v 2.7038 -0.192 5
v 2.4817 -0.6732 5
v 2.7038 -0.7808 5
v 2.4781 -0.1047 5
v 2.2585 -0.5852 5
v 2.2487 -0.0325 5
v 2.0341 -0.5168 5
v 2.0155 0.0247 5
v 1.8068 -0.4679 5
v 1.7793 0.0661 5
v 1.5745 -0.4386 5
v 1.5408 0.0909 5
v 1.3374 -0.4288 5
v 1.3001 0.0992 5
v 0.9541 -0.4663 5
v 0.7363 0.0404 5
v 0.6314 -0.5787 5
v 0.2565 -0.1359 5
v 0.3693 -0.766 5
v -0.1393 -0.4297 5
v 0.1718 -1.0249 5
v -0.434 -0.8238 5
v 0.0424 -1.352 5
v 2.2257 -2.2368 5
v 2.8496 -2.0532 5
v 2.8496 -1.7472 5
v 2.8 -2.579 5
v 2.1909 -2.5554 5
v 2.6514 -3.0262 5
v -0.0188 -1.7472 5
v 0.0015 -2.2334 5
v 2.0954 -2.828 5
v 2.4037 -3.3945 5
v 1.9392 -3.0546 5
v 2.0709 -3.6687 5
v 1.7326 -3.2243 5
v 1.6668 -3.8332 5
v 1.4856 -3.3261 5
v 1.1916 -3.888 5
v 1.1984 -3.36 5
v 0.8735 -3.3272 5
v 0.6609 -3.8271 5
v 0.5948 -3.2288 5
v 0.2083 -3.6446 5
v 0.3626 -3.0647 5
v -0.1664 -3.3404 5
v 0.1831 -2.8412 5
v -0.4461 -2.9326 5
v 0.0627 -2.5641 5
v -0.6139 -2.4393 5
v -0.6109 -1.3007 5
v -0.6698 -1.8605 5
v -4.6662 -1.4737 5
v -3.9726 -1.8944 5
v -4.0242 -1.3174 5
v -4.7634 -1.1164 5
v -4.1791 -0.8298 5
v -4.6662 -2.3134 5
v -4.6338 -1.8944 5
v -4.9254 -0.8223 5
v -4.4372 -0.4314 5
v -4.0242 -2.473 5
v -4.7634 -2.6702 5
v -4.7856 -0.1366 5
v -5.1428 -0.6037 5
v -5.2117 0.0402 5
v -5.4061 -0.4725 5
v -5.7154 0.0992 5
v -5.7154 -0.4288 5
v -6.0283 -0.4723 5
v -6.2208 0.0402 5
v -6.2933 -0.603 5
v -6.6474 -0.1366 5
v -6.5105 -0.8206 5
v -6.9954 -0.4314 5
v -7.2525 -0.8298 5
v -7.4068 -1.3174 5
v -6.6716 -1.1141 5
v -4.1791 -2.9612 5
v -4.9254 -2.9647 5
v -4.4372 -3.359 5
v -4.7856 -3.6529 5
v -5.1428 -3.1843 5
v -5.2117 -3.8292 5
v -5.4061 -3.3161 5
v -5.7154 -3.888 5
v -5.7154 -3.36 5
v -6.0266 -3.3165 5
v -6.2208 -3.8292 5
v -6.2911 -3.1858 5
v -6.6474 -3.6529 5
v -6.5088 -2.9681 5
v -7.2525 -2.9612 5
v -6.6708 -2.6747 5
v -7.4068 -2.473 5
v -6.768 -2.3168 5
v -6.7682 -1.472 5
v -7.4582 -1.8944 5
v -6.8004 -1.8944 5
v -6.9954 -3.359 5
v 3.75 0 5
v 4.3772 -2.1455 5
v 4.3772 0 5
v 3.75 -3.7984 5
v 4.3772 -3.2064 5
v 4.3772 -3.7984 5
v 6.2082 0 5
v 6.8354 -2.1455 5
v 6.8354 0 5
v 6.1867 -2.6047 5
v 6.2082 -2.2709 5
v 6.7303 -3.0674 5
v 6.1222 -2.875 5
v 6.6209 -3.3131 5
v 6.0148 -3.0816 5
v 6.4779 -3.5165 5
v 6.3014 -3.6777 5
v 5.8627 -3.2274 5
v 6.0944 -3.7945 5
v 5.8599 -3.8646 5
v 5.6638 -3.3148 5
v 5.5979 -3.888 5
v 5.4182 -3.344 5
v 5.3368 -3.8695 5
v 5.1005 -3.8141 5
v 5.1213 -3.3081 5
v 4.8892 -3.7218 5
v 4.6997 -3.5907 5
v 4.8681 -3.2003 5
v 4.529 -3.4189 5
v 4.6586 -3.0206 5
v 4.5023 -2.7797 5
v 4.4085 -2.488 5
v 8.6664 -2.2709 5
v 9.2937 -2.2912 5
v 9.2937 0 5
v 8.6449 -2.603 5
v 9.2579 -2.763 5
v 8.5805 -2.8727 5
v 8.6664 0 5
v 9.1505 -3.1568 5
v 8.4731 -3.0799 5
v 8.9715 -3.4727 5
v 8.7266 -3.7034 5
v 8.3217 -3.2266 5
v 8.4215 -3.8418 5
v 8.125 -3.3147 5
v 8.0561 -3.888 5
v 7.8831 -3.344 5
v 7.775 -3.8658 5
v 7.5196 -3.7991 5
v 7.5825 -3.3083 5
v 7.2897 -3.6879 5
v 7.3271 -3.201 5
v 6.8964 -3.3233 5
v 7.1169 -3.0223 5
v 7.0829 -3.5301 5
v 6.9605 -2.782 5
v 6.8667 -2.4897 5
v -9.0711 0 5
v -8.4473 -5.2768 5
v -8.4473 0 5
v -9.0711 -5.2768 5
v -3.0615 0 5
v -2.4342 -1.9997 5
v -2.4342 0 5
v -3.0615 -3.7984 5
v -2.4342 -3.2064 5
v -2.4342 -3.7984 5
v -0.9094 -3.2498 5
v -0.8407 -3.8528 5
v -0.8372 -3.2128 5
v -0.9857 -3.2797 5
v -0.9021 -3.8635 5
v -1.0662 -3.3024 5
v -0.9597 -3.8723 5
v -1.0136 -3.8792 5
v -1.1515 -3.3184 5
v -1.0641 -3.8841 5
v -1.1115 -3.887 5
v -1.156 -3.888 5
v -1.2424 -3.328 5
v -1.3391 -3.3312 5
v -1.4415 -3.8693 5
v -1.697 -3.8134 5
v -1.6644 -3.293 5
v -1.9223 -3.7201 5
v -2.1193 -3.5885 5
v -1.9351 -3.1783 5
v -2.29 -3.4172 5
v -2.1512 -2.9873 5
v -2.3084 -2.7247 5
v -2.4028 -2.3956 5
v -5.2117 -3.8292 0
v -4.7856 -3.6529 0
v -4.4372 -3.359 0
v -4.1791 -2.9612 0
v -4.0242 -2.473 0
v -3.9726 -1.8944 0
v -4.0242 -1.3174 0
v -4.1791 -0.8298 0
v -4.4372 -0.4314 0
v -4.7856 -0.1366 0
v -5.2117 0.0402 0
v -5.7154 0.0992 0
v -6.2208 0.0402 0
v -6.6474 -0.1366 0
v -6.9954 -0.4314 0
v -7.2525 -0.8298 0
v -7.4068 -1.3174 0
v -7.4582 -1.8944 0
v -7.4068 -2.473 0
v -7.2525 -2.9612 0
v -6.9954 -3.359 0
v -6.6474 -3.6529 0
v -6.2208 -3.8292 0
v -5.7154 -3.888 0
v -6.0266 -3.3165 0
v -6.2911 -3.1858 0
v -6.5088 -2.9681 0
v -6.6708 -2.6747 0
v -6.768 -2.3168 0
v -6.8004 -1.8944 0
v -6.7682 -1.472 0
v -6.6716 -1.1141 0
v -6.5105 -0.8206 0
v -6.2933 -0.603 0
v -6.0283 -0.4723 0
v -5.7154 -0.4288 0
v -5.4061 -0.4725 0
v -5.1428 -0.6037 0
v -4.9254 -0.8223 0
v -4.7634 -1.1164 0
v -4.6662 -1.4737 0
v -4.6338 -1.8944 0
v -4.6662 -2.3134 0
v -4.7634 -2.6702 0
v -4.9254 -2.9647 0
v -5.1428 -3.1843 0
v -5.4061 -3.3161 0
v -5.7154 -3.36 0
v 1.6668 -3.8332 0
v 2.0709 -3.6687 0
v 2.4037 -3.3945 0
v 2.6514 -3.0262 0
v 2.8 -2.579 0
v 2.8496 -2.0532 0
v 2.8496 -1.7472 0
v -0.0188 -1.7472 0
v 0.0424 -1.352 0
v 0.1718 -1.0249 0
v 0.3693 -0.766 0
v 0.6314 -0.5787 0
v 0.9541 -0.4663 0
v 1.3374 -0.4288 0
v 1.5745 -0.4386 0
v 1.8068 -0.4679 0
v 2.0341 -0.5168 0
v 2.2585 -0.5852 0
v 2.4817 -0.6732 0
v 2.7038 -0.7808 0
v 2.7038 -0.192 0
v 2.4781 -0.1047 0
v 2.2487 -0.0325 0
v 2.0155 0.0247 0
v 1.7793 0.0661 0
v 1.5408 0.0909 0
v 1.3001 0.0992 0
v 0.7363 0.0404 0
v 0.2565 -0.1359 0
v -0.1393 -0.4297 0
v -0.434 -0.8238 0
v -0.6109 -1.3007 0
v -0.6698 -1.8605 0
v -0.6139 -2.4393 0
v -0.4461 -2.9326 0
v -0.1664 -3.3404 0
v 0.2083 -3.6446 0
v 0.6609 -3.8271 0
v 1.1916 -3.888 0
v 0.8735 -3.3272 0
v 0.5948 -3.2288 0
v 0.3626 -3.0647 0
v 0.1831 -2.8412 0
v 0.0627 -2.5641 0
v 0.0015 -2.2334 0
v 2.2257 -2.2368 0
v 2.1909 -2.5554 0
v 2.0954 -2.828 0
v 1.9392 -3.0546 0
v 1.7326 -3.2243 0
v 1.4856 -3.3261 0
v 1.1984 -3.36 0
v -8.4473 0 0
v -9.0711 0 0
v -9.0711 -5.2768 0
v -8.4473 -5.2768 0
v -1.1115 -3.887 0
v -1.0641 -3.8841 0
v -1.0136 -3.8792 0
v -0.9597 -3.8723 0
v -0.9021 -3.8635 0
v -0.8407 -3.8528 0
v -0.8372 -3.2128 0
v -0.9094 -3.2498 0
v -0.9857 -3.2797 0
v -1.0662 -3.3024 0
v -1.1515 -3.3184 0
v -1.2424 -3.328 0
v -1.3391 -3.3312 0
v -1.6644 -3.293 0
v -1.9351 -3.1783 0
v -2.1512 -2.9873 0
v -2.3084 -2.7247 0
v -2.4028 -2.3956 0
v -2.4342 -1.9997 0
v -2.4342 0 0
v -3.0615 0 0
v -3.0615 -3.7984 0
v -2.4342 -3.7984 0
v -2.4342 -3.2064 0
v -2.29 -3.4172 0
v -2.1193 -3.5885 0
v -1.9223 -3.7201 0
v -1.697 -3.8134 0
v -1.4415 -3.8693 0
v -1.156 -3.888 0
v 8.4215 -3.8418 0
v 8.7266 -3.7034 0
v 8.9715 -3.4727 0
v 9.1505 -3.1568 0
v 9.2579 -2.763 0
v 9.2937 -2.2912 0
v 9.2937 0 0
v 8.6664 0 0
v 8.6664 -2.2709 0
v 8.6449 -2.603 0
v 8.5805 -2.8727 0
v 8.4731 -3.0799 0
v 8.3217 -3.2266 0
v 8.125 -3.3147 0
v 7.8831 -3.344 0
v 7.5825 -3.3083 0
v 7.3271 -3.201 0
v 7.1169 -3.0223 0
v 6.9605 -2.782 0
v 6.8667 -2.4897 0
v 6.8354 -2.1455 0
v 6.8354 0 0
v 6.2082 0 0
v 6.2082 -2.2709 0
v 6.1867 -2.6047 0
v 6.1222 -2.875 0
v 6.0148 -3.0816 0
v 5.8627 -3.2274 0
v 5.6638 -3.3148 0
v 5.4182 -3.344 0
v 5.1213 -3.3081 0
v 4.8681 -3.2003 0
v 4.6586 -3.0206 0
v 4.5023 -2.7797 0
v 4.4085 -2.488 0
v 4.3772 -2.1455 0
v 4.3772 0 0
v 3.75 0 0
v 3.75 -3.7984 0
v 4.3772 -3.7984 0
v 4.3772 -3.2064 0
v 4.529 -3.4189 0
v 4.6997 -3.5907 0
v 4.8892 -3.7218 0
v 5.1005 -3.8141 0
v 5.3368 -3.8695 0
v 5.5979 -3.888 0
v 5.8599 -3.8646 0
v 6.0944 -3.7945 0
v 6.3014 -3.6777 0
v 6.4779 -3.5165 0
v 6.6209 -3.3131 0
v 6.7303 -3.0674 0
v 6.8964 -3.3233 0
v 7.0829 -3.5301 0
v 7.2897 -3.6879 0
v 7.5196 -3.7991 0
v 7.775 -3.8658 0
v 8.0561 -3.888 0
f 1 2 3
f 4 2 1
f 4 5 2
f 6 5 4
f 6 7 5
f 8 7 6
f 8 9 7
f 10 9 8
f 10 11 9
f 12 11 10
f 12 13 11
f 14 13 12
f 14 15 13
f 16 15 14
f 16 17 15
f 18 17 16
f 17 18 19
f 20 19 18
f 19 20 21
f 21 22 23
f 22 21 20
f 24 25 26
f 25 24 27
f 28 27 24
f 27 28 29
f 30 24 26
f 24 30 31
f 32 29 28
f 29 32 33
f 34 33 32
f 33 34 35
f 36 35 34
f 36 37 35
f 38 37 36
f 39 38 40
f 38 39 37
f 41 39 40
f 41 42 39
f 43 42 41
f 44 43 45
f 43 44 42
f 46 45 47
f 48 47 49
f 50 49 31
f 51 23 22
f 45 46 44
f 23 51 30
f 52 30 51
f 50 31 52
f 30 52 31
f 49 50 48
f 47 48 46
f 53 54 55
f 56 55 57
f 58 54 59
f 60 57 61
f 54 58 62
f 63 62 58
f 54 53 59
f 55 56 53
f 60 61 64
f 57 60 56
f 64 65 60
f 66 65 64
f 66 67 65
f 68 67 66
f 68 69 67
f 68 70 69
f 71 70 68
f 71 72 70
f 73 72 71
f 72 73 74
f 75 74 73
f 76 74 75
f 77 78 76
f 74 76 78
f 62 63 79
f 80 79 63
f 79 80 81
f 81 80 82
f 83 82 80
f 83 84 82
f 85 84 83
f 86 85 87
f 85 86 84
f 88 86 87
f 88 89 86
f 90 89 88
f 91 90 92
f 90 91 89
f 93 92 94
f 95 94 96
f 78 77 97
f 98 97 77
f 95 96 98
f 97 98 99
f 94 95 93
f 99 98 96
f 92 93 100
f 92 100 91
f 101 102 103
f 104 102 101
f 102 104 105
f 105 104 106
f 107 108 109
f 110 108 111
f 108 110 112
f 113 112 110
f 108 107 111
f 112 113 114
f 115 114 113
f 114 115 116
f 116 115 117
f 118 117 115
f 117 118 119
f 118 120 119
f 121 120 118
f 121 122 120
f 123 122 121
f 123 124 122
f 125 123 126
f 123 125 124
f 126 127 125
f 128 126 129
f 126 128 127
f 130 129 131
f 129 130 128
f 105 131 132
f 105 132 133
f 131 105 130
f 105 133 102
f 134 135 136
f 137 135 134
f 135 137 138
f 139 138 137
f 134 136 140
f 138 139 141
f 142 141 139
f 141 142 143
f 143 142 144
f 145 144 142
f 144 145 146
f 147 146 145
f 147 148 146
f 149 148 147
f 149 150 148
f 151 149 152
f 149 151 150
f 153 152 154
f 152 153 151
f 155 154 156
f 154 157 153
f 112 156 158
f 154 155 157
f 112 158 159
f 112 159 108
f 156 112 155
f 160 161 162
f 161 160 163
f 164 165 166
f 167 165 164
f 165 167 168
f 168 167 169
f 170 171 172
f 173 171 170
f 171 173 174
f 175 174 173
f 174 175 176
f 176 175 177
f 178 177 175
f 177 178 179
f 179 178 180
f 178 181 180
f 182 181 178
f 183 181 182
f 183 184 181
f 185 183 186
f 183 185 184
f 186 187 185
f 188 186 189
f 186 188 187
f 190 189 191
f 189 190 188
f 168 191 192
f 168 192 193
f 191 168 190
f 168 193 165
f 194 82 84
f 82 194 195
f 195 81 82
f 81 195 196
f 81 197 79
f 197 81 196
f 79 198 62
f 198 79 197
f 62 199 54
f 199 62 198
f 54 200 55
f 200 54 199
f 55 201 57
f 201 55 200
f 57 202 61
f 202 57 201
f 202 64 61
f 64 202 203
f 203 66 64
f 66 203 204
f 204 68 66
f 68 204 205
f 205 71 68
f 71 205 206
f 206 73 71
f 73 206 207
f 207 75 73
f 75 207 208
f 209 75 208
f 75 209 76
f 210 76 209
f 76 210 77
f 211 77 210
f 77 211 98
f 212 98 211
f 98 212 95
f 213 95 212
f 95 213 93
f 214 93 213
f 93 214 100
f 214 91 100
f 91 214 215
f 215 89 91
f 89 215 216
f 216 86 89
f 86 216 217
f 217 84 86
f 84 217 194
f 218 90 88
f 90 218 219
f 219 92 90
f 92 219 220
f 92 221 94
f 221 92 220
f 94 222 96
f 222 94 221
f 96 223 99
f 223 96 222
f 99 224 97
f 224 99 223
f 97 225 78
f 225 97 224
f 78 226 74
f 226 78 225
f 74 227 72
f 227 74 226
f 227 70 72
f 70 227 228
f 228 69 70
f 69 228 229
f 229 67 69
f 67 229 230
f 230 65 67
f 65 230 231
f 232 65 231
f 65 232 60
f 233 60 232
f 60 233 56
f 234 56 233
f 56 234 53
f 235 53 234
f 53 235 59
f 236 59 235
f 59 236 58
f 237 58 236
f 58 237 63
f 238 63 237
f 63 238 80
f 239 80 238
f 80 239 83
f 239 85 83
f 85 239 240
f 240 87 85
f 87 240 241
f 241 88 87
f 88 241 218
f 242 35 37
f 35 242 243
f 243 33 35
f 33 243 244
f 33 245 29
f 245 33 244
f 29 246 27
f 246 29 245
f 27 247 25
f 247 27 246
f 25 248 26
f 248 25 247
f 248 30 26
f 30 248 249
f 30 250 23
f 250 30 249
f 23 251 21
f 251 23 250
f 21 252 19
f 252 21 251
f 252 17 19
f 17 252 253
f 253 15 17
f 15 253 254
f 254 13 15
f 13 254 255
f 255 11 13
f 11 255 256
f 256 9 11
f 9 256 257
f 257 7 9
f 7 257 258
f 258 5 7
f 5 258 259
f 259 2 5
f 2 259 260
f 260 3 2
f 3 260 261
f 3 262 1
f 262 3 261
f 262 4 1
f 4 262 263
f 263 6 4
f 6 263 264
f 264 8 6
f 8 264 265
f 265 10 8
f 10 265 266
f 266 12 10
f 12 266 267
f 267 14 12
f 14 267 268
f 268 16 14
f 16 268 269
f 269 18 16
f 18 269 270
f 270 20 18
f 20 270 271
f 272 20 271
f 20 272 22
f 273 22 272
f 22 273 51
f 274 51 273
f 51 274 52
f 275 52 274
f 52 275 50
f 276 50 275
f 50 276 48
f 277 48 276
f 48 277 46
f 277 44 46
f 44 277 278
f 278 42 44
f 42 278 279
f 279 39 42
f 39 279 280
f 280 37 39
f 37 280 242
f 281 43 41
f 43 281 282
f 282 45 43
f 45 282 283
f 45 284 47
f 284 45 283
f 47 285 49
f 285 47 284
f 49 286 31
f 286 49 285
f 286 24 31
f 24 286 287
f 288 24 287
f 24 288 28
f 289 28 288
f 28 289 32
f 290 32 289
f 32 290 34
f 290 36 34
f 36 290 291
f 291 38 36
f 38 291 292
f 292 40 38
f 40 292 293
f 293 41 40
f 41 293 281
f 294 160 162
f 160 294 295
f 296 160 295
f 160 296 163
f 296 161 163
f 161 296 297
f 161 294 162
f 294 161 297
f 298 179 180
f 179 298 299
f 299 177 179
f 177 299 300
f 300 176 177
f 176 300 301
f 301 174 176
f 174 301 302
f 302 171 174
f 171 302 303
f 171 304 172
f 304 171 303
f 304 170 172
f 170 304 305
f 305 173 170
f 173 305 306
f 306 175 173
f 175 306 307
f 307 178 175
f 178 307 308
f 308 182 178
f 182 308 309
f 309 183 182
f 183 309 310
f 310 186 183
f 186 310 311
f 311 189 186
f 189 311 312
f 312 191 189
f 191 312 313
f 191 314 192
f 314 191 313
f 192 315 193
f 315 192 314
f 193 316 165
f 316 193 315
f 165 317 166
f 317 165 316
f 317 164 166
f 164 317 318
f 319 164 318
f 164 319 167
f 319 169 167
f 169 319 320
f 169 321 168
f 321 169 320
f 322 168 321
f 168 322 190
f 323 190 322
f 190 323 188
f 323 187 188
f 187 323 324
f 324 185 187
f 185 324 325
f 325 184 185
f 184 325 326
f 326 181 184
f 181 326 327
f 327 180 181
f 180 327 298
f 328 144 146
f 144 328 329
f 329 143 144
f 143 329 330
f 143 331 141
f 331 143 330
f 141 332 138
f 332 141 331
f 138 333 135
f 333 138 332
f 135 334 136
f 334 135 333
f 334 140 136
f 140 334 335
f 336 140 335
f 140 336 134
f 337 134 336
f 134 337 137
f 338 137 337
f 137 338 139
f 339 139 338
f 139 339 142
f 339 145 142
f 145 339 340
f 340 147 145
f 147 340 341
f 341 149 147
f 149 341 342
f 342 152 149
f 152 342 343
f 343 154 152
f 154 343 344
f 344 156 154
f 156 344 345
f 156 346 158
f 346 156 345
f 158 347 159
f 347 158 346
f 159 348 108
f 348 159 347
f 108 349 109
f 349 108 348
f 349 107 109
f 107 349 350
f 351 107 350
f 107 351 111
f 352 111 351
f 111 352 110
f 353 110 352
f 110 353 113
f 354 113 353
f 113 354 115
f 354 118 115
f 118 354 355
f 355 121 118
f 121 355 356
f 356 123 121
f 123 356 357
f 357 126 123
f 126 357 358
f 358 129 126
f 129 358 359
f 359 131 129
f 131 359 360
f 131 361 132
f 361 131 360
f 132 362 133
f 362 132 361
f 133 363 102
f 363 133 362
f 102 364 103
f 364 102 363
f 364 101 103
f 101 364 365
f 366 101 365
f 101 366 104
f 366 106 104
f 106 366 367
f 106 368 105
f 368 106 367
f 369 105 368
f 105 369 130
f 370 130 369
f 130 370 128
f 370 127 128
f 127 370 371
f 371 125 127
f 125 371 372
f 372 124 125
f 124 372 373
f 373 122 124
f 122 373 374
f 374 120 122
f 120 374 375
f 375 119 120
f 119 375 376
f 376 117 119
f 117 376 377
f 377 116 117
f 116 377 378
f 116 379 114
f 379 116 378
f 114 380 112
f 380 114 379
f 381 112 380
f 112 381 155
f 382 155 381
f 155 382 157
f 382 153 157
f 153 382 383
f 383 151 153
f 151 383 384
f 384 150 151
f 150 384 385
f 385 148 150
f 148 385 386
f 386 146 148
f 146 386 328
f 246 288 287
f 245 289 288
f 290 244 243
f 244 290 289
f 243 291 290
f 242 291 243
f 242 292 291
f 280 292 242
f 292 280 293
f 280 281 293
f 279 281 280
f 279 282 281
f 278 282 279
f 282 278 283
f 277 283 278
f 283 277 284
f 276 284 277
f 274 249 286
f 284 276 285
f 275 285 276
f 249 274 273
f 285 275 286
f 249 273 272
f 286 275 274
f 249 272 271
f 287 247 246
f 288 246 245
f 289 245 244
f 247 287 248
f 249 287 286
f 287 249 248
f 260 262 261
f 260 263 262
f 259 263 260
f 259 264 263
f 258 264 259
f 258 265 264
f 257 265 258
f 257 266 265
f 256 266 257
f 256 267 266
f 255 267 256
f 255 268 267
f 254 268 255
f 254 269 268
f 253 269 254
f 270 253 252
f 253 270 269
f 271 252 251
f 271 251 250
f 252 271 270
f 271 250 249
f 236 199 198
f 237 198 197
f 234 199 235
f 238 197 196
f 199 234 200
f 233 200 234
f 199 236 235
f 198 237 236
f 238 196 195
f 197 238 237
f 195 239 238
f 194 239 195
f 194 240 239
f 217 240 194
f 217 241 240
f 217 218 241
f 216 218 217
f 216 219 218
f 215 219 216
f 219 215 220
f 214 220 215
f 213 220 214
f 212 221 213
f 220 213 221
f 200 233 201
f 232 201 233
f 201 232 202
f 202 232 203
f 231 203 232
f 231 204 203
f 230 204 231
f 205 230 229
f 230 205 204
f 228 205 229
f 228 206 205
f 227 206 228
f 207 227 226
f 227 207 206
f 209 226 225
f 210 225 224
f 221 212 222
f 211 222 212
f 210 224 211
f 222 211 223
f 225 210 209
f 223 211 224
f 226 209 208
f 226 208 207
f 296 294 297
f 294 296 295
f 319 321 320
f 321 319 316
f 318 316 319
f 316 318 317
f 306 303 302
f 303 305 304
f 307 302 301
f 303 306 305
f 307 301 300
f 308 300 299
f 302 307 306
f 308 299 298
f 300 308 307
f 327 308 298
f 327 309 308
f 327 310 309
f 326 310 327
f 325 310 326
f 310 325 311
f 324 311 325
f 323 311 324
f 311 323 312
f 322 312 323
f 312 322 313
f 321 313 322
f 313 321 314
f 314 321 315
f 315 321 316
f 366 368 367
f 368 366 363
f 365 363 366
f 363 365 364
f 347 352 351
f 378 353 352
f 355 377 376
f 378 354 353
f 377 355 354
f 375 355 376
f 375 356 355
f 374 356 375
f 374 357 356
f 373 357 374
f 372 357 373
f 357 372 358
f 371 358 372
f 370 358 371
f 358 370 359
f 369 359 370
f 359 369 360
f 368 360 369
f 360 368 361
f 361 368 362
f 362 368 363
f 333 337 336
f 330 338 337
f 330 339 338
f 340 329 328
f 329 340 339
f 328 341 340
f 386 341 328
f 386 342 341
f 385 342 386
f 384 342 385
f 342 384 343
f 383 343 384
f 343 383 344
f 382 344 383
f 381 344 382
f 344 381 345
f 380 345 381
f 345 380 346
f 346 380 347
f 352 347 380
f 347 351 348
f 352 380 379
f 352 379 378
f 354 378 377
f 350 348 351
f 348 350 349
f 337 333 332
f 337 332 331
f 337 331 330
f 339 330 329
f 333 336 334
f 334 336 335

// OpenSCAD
/** 
 * draw silkscreen text
 */

//FONT="Bitstream Vera Sans Mono:style=Bold";
FONT="Source Code Pro";

/**
 * draw the silkscreen text
 */
module silkscreen( text="lorem", thickness=5, screen=0.1, font_size=5, font=FONT, halign="center") {
    translate( [0, 0, screen])
        linear_extrude(height = thickness-screen)
            rotate([180,0,0])
                text(text = text, font=font, size=font_size, halign=halign);
}

/** 
 * draw preview text
 */
module silkscreen_text( text="lorem", thickness=5, screen=0.1, font_size=5, font=FONT, halign="center") {
    color("blue") translate([0,0,0])
        linear_extrude(height=screen)
            rotate([180,0,0])
                text(text=text, font=font, size=font_size, halign=halign);
}

translate([0,0,0]) silkscreen();
translate([0,0,0]) silkscreen_text(); 
